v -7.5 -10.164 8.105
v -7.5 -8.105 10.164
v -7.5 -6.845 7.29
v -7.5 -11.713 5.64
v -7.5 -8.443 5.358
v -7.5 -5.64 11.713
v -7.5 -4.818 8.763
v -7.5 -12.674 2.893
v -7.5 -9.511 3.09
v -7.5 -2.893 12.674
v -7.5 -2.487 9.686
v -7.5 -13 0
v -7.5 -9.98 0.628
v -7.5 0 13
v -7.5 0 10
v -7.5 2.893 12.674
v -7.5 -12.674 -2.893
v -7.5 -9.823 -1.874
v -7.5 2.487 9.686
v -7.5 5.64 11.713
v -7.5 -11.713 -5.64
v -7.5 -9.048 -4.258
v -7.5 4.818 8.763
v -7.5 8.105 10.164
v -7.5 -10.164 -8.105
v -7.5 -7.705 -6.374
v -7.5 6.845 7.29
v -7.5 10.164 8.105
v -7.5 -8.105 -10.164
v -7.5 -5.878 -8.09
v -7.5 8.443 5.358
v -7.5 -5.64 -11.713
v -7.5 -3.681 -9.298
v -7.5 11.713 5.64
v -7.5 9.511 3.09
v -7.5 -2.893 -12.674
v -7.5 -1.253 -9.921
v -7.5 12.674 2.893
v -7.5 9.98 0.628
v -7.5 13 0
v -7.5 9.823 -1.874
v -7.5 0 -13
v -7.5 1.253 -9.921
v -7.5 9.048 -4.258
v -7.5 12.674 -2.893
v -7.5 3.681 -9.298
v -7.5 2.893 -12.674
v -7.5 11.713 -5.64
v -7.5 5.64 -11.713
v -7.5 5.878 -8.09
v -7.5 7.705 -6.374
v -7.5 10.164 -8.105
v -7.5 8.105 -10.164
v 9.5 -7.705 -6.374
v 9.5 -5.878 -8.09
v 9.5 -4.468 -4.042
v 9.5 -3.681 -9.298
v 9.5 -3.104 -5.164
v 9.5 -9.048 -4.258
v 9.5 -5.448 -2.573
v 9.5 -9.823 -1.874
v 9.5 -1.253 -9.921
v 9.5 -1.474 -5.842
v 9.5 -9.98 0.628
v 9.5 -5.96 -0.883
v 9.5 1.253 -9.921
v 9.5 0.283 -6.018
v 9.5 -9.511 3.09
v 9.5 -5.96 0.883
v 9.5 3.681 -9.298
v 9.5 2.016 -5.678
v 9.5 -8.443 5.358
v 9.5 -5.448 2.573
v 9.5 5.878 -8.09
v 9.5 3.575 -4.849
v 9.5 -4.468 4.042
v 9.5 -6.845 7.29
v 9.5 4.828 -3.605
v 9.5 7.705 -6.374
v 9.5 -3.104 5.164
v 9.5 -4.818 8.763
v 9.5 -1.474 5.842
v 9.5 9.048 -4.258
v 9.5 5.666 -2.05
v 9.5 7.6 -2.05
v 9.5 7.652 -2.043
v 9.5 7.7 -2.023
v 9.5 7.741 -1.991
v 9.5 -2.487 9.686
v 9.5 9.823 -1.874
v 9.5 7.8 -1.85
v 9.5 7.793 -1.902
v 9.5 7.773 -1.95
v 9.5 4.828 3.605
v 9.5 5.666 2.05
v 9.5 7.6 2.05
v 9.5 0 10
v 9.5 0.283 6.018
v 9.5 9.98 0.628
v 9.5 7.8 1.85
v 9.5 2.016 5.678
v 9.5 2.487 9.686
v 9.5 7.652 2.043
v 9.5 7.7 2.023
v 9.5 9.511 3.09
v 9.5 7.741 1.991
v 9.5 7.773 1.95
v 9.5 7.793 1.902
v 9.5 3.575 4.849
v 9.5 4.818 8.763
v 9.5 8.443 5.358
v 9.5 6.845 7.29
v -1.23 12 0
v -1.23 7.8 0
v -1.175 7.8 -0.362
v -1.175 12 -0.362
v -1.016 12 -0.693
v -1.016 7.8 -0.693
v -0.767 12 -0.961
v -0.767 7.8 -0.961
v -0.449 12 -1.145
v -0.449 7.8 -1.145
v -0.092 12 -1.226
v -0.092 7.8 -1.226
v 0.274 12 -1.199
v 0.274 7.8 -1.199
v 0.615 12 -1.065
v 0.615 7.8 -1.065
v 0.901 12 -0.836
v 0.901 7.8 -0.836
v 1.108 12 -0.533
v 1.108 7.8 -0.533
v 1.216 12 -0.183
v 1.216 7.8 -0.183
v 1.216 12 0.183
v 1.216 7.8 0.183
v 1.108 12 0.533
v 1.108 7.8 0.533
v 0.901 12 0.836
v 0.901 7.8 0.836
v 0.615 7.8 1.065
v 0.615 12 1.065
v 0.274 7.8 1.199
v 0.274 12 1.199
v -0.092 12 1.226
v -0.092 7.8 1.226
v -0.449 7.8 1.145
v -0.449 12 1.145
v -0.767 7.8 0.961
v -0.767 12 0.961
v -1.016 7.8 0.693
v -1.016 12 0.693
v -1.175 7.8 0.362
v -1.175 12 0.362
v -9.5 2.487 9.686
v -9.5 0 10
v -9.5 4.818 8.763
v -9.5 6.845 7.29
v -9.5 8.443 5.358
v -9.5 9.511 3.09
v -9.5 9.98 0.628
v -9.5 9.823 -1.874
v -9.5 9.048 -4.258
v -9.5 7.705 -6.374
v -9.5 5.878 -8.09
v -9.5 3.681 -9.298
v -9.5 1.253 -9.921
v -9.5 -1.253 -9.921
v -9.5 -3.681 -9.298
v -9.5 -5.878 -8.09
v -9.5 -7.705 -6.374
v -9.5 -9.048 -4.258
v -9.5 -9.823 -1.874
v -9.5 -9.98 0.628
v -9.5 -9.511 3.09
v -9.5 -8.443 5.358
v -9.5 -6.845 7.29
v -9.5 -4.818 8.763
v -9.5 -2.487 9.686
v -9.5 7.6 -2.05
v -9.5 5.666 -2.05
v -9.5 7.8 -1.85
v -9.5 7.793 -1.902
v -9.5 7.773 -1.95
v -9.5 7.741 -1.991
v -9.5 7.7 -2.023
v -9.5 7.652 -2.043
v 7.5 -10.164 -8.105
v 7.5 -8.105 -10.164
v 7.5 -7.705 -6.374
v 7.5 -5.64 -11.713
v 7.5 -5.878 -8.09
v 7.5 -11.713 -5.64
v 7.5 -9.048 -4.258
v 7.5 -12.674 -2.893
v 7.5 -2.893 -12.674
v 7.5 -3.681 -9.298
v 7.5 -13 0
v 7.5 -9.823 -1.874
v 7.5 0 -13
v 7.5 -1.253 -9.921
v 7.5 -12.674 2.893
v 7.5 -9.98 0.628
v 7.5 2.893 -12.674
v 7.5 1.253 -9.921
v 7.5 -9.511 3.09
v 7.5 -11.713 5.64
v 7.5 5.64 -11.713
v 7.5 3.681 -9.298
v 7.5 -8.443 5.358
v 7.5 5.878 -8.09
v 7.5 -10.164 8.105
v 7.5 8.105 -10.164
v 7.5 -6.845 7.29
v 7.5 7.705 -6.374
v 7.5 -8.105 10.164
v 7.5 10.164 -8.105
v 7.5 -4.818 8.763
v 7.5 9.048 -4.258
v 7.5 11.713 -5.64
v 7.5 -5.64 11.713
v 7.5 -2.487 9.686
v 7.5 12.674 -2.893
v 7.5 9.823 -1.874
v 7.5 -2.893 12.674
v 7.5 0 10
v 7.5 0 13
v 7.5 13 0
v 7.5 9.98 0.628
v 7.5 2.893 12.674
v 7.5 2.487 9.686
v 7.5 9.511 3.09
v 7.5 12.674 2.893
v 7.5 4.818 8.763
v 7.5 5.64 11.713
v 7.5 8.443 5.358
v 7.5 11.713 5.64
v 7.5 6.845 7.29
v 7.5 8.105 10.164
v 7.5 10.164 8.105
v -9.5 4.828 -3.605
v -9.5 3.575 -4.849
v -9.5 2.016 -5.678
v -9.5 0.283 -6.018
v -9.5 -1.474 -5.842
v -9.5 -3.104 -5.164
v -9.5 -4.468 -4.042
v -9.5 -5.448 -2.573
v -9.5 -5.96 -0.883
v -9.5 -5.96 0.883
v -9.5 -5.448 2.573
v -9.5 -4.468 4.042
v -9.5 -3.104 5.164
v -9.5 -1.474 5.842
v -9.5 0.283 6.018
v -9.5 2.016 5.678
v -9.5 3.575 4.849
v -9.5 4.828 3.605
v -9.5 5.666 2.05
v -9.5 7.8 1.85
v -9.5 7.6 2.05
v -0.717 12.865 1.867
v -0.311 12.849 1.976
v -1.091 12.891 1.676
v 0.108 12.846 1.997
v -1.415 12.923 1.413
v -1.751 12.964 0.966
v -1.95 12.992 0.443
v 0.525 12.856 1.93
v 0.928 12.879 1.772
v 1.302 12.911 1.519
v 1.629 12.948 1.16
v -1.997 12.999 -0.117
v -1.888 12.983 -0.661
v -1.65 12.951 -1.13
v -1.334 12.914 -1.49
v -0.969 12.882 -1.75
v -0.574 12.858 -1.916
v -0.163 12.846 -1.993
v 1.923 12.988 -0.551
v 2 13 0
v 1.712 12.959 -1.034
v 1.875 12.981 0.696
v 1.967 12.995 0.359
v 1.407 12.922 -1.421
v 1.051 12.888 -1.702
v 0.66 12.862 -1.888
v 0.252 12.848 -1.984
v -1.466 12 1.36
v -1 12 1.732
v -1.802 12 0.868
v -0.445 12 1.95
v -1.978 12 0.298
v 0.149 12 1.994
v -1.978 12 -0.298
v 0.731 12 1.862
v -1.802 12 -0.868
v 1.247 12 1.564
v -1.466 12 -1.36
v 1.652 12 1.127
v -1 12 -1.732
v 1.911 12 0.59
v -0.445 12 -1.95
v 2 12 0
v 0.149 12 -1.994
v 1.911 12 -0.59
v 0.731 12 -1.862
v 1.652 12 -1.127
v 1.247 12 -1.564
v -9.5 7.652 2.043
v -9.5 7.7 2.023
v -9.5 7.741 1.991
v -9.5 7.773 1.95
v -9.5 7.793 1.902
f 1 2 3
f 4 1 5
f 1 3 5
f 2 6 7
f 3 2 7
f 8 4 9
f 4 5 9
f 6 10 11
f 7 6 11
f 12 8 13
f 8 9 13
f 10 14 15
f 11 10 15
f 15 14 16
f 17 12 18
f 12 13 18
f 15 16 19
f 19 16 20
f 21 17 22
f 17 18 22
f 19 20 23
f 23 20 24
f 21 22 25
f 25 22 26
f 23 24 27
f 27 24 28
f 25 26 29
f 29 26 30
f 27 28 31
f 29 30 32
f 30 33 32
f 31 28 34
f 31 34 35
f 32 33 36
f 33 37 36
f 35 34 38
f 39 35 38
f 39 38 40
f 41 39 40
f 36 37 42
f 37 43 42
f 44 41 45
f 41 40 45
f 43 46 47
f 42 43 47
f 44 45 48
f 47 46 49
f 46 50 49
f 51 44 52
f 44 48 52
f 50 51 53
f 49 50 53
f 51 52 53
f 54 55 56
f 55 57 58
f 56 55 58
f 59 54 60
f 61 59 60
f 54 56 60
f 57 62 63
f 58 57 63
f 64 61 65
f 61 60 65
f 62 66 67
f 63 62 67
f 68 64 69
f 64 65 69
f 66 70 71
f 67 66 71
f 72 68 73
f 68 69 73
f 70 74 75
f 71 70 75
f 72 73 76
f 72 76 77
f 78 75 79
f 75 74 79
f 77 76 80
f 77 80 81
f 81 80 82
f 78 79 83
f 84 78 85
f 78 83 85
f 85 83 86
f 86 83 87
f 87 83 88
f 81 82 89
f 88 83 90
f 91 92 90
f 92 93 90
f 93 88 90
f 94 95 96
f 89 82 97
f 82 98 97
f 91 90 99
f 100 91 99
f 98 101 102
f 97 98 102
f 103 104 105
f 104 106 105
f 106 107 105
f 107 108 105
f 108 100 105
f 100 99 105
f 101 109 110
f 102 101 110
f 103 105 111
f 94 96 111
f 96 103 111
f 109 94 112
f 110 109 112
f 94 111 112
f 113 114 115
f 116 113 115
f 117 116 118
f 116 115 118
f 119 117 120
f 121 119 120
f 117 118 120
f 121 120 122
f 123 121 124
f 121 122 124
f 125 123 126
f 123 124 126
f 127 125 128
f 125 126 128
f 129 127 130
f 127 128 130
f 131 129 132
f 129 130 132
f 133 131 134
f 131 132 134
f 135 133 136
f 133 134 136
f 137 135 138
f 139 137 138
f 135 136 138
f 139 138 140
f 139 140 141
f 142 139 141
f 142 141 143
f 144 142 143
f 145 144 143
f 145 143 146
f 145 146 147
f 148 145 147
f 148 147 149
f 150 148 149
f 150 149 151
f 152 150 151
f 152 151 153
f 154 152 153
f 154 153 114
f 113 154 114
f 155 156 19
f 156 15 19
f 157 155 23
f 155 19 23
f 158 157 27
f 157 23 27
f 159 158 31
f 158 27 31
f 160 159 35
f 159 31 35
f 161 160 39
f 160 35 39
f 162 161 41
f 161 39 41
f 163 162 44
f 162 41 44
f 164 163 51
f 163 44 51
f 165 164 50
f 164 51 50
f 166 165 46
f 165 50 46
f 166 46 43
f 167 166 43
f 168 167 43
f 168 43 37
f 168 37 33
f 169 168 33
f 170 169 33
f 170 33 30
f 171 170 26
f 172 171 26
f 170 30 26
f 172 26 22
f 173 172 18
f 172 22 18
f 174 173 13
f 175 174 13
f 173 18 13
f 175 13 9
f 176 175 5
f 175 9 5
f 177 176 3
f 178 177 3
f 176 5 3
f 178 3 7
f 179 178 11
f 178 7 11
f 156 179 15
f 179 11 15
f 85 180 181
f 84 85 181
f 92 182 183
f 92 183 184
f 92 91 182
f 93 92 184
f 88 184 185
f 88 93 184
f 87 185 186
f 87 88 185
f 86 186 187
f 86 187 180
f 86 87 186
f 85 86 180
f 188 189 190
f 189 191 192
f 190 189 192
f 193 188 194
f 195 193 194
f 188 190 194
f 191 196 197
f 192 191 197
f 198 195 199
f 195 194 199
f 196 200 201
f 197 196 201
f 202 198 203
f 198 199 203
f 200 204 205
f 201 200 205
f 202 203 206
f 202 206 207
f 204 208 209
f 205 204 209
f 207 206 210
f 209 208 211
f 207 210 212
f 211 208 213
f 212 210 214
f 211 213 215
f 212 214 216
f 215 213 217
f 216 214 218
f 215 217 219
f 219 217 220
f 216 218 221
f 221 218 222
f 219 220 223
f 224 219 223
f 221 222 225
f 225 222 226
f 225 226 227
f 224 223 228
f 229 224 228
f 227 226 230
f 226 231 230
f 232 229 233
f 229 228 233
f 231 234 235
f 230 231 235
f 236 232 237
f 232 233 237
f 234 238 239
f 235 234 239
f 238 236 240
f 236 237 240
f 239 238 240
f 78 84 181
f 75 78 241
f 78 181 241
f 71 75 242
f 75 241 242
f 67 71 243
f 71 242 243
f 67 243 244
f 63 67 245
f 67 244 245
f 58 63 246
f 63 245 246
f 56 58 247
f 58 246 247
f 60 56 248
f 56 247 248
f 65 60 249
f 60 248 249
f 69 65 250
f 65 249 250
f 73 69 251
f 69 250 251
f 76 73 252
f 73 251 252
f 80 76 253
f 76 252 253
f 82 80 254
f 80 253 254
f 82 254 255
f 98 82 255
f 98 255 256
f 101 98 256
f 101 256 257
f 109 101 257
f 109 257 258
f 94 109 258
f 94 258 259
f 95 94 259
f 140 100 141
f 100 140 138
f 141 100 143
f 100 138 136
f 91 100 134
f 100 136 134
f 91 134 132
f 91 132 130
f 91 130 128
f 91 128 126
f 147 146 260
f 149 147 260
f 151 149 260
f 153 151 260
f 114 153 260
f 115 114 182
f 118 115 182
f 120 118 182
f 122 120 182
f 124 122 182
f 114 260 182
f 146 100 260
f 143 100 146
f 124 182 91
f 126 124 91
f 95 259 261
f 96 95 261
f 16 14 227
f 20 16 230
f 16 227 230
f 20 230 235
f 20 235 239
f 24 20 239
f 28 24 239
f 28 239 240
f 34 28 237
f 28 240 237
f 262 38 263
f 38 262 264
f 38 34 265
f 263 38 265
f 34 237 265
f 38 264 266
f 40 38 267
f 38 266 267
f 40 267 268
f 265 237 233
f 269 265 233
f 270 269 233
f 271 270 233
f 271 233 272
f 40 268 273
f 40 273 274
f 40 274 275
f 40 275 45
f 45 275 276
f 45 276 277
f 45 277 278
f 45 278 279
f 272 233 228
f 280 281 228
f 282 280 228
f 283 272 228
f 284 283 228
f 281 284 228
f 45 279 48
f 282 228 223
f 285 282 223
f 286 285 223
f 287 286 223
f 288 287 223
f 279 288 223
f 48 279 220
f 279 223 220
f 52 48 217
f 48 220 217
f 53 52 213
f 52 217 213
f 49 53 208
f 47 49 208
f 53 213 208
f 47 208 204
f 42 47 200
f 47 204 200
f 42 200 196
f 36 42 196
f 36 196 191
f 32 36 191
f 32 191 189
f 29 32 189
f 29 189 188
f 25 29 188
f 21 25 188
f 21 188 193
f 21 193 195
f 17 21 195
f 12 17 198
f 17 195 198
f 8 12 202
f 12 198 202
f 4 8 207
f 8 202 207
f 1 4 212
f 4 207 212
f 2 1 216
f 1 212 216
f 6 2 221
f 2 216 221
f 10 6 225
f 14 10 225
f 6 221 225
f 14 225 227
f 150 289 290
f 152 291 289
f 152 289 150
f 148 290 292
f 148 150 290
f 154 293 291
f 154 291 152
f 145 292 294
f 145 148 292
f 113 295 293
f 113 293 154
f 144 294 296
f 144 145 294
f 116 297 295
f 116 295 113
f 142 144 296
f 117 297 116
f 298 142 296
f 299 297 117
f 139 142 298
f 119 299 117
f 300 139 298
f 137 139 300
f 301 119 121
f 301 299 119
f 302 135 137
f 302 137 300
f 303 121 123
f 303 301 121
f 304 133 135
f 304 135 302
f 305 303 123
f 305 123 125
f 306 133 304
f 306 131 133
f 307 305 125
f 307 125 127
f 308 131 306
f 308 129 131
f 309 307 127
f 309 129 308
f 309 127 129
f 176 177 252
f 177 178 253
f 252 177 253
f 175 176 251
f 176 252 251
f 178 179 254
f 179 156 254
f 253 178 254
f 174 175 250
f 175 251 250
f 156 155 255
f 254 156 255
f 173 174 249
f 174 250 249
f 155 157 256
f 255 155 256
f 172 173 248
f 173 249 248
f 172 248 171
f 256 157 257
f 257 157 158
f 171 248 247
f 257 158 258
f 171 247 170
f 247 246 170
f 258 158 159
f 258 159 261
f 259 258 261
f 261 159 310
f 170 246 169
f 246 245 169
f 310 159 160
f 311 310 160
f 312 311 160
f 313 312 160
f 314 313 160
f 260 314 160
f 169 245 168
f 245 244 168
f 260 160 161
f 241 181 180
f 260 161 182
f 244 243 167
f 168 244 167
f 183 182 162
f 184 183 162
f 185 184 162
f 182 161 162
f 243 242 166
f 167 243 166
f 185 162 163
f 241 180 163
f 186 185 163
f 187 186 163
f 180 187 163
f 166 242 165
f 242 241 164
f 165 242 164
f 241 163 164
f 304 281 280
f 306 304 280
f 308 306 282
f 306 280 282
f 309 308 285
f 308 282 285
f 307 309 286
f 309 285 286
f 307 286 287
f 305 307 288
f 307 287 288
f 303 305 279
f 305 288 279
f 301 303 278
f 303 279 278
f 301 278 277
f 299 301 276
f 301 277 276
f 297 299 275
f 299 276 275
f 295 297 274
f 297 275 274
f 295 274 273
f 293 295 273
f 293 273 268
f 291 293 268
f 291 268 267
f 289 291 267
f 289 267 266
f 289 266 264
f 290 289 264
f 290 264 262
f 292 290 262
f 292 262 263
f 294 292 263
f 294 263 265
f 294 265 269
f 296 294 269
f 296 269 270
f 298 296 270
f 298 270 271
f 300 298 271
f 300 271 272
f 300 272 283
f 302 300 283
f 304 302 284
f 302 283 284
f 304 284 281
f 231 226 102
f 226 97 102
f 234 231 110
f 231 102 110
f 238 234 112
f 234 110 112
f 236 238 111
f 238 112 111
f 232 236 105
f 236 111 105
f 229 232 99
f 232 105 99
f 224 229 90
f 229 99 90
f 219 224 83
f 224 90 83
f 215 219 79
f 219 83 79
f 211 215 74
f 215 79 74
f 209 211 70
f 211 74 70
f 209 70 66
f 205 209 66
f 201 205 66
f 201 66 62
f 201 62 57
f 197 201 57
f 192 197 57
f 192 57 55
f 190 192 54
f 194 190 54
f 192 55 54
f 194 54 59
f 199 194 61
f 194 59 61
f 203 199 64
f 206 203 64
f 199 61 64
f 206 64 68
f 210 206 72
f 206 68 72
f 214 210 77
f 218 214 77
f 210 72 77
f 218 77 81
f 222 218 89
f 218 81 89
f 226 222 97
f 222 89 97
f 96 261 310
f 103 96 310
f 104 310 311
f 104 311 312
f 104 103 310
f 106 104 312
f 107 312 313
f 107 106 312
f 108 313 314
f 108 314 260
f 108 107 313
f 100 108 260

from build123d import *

# Parameters (mm, degrees)
CUT_EXTRUDE1_DEPTH                               = 27.438608133
SKETCH3_W                                        = 19
SKETCH3_H                                        = 6.025
CBORE_FOR_M2_HEX_HEAD_MACHINE_SCREW2_D           = 2.459
CBORE_FOR_M2_HEX_HEAD_MACHINE_SCREW2_DEPTH       = 27.463932023
CBORE_FOR_M2_HEX_HEAD_MACHINE_SCREW2_CBORE_D     = 4
CBORE_FOR_M2_HEX_HEAD_MACHINE_SCREW2_CBORE_DEPTH = 23.263932023
FILLET1_R                                        = 0.2


with BuildPart() as part:
    # Sketch1 → Revolve1 (revolve)
    with BuildSketch(Plane(origin=(0, 0, 0), x_dir=(-1, 0, 0), z_dir=(0, 0, -1)), mode=Mode.PRIVATE) as revolve1_sk:
        Polygon((-9.5, 10), (-9.5, 0), (9.5, 0), (9.5, 10), (7.5, 10), (7.5, 13), (-7.5, 13), (-7.5, 10), align=None)
    revolve(revolve1_sk.sketch.rotate(Axis((9.5, 0, 0), (-1, 0, 0)), 270), axis=Axis((9.5, 0, 0), (-1, 0, 0)))

    # Sketch2 → Cut-Extrude1 (cut, through all)
    with BuildSketch(Plane.ZY.offset(9.5)):
        with BuildLine():
            Line((2.05, 5.638927203), (2.05, 7.8))
            Line((2.05, 7.8), (-2.05, 7.8))
            Line((-2.05, 7.8), (-2.05, 5.638927203))
            ThreePointArc((-2.05, 5.638927203), (0, 6), (2.05, 5.638927203))
        make_face()
    extrude(amount=-CUT_EXTRUDE1_DEPTH, mode=Mode.SUBTRACT)

    # Sketch3 → 0.5mm clearance (revolve, cut)
    with BuildSketch(Plane(origin=(0, 0, 0), x_dir=(-1, 0, 0), z_dir=(0, 0, -1))):
        with Locations((0, 3.0125)):
            Rectangle(SKETCH3_W, SKETCH3_H)
    revolve(axis=Axis((9.5, 0, 0), (-1, 0, 0)), mode=Mode.SUBTRACT)

    # CBORE for M2 Hex Head Machine Screw2
    with Locations(Plane(origin=(0, 35.263932023, 0), x_dir=(1, 0, 0), z_dir=(0, 1, 0))):
        with Locations((0, 0)):
            CounterBoreHole(CBORE_FOR_M2_HEX_HEAD_MACHINE_SCREW2_D / 2, CBORE_FOR_M2_HEX_HEAD_MACHINE_SCREW2_CBORE_D / 2, CBORE_FOR_M2_HEX_HEAD_MACHINE_SCREW2_CBORE_DEPTH, depth=CBORE_FOR_M2_HEX_HEAD_MACHINE_SCREW2_DEPTH)

    # Fillet1
    fillet1_edges = [part.edges().sort_by_distance(p)[0] for p in [
        (0, 7.8, -2.05),
        (0, 7.8, 2.05),
    ]]
    fillet(fillet1_edges, radius=FILLET1_R)


solid = part.part
